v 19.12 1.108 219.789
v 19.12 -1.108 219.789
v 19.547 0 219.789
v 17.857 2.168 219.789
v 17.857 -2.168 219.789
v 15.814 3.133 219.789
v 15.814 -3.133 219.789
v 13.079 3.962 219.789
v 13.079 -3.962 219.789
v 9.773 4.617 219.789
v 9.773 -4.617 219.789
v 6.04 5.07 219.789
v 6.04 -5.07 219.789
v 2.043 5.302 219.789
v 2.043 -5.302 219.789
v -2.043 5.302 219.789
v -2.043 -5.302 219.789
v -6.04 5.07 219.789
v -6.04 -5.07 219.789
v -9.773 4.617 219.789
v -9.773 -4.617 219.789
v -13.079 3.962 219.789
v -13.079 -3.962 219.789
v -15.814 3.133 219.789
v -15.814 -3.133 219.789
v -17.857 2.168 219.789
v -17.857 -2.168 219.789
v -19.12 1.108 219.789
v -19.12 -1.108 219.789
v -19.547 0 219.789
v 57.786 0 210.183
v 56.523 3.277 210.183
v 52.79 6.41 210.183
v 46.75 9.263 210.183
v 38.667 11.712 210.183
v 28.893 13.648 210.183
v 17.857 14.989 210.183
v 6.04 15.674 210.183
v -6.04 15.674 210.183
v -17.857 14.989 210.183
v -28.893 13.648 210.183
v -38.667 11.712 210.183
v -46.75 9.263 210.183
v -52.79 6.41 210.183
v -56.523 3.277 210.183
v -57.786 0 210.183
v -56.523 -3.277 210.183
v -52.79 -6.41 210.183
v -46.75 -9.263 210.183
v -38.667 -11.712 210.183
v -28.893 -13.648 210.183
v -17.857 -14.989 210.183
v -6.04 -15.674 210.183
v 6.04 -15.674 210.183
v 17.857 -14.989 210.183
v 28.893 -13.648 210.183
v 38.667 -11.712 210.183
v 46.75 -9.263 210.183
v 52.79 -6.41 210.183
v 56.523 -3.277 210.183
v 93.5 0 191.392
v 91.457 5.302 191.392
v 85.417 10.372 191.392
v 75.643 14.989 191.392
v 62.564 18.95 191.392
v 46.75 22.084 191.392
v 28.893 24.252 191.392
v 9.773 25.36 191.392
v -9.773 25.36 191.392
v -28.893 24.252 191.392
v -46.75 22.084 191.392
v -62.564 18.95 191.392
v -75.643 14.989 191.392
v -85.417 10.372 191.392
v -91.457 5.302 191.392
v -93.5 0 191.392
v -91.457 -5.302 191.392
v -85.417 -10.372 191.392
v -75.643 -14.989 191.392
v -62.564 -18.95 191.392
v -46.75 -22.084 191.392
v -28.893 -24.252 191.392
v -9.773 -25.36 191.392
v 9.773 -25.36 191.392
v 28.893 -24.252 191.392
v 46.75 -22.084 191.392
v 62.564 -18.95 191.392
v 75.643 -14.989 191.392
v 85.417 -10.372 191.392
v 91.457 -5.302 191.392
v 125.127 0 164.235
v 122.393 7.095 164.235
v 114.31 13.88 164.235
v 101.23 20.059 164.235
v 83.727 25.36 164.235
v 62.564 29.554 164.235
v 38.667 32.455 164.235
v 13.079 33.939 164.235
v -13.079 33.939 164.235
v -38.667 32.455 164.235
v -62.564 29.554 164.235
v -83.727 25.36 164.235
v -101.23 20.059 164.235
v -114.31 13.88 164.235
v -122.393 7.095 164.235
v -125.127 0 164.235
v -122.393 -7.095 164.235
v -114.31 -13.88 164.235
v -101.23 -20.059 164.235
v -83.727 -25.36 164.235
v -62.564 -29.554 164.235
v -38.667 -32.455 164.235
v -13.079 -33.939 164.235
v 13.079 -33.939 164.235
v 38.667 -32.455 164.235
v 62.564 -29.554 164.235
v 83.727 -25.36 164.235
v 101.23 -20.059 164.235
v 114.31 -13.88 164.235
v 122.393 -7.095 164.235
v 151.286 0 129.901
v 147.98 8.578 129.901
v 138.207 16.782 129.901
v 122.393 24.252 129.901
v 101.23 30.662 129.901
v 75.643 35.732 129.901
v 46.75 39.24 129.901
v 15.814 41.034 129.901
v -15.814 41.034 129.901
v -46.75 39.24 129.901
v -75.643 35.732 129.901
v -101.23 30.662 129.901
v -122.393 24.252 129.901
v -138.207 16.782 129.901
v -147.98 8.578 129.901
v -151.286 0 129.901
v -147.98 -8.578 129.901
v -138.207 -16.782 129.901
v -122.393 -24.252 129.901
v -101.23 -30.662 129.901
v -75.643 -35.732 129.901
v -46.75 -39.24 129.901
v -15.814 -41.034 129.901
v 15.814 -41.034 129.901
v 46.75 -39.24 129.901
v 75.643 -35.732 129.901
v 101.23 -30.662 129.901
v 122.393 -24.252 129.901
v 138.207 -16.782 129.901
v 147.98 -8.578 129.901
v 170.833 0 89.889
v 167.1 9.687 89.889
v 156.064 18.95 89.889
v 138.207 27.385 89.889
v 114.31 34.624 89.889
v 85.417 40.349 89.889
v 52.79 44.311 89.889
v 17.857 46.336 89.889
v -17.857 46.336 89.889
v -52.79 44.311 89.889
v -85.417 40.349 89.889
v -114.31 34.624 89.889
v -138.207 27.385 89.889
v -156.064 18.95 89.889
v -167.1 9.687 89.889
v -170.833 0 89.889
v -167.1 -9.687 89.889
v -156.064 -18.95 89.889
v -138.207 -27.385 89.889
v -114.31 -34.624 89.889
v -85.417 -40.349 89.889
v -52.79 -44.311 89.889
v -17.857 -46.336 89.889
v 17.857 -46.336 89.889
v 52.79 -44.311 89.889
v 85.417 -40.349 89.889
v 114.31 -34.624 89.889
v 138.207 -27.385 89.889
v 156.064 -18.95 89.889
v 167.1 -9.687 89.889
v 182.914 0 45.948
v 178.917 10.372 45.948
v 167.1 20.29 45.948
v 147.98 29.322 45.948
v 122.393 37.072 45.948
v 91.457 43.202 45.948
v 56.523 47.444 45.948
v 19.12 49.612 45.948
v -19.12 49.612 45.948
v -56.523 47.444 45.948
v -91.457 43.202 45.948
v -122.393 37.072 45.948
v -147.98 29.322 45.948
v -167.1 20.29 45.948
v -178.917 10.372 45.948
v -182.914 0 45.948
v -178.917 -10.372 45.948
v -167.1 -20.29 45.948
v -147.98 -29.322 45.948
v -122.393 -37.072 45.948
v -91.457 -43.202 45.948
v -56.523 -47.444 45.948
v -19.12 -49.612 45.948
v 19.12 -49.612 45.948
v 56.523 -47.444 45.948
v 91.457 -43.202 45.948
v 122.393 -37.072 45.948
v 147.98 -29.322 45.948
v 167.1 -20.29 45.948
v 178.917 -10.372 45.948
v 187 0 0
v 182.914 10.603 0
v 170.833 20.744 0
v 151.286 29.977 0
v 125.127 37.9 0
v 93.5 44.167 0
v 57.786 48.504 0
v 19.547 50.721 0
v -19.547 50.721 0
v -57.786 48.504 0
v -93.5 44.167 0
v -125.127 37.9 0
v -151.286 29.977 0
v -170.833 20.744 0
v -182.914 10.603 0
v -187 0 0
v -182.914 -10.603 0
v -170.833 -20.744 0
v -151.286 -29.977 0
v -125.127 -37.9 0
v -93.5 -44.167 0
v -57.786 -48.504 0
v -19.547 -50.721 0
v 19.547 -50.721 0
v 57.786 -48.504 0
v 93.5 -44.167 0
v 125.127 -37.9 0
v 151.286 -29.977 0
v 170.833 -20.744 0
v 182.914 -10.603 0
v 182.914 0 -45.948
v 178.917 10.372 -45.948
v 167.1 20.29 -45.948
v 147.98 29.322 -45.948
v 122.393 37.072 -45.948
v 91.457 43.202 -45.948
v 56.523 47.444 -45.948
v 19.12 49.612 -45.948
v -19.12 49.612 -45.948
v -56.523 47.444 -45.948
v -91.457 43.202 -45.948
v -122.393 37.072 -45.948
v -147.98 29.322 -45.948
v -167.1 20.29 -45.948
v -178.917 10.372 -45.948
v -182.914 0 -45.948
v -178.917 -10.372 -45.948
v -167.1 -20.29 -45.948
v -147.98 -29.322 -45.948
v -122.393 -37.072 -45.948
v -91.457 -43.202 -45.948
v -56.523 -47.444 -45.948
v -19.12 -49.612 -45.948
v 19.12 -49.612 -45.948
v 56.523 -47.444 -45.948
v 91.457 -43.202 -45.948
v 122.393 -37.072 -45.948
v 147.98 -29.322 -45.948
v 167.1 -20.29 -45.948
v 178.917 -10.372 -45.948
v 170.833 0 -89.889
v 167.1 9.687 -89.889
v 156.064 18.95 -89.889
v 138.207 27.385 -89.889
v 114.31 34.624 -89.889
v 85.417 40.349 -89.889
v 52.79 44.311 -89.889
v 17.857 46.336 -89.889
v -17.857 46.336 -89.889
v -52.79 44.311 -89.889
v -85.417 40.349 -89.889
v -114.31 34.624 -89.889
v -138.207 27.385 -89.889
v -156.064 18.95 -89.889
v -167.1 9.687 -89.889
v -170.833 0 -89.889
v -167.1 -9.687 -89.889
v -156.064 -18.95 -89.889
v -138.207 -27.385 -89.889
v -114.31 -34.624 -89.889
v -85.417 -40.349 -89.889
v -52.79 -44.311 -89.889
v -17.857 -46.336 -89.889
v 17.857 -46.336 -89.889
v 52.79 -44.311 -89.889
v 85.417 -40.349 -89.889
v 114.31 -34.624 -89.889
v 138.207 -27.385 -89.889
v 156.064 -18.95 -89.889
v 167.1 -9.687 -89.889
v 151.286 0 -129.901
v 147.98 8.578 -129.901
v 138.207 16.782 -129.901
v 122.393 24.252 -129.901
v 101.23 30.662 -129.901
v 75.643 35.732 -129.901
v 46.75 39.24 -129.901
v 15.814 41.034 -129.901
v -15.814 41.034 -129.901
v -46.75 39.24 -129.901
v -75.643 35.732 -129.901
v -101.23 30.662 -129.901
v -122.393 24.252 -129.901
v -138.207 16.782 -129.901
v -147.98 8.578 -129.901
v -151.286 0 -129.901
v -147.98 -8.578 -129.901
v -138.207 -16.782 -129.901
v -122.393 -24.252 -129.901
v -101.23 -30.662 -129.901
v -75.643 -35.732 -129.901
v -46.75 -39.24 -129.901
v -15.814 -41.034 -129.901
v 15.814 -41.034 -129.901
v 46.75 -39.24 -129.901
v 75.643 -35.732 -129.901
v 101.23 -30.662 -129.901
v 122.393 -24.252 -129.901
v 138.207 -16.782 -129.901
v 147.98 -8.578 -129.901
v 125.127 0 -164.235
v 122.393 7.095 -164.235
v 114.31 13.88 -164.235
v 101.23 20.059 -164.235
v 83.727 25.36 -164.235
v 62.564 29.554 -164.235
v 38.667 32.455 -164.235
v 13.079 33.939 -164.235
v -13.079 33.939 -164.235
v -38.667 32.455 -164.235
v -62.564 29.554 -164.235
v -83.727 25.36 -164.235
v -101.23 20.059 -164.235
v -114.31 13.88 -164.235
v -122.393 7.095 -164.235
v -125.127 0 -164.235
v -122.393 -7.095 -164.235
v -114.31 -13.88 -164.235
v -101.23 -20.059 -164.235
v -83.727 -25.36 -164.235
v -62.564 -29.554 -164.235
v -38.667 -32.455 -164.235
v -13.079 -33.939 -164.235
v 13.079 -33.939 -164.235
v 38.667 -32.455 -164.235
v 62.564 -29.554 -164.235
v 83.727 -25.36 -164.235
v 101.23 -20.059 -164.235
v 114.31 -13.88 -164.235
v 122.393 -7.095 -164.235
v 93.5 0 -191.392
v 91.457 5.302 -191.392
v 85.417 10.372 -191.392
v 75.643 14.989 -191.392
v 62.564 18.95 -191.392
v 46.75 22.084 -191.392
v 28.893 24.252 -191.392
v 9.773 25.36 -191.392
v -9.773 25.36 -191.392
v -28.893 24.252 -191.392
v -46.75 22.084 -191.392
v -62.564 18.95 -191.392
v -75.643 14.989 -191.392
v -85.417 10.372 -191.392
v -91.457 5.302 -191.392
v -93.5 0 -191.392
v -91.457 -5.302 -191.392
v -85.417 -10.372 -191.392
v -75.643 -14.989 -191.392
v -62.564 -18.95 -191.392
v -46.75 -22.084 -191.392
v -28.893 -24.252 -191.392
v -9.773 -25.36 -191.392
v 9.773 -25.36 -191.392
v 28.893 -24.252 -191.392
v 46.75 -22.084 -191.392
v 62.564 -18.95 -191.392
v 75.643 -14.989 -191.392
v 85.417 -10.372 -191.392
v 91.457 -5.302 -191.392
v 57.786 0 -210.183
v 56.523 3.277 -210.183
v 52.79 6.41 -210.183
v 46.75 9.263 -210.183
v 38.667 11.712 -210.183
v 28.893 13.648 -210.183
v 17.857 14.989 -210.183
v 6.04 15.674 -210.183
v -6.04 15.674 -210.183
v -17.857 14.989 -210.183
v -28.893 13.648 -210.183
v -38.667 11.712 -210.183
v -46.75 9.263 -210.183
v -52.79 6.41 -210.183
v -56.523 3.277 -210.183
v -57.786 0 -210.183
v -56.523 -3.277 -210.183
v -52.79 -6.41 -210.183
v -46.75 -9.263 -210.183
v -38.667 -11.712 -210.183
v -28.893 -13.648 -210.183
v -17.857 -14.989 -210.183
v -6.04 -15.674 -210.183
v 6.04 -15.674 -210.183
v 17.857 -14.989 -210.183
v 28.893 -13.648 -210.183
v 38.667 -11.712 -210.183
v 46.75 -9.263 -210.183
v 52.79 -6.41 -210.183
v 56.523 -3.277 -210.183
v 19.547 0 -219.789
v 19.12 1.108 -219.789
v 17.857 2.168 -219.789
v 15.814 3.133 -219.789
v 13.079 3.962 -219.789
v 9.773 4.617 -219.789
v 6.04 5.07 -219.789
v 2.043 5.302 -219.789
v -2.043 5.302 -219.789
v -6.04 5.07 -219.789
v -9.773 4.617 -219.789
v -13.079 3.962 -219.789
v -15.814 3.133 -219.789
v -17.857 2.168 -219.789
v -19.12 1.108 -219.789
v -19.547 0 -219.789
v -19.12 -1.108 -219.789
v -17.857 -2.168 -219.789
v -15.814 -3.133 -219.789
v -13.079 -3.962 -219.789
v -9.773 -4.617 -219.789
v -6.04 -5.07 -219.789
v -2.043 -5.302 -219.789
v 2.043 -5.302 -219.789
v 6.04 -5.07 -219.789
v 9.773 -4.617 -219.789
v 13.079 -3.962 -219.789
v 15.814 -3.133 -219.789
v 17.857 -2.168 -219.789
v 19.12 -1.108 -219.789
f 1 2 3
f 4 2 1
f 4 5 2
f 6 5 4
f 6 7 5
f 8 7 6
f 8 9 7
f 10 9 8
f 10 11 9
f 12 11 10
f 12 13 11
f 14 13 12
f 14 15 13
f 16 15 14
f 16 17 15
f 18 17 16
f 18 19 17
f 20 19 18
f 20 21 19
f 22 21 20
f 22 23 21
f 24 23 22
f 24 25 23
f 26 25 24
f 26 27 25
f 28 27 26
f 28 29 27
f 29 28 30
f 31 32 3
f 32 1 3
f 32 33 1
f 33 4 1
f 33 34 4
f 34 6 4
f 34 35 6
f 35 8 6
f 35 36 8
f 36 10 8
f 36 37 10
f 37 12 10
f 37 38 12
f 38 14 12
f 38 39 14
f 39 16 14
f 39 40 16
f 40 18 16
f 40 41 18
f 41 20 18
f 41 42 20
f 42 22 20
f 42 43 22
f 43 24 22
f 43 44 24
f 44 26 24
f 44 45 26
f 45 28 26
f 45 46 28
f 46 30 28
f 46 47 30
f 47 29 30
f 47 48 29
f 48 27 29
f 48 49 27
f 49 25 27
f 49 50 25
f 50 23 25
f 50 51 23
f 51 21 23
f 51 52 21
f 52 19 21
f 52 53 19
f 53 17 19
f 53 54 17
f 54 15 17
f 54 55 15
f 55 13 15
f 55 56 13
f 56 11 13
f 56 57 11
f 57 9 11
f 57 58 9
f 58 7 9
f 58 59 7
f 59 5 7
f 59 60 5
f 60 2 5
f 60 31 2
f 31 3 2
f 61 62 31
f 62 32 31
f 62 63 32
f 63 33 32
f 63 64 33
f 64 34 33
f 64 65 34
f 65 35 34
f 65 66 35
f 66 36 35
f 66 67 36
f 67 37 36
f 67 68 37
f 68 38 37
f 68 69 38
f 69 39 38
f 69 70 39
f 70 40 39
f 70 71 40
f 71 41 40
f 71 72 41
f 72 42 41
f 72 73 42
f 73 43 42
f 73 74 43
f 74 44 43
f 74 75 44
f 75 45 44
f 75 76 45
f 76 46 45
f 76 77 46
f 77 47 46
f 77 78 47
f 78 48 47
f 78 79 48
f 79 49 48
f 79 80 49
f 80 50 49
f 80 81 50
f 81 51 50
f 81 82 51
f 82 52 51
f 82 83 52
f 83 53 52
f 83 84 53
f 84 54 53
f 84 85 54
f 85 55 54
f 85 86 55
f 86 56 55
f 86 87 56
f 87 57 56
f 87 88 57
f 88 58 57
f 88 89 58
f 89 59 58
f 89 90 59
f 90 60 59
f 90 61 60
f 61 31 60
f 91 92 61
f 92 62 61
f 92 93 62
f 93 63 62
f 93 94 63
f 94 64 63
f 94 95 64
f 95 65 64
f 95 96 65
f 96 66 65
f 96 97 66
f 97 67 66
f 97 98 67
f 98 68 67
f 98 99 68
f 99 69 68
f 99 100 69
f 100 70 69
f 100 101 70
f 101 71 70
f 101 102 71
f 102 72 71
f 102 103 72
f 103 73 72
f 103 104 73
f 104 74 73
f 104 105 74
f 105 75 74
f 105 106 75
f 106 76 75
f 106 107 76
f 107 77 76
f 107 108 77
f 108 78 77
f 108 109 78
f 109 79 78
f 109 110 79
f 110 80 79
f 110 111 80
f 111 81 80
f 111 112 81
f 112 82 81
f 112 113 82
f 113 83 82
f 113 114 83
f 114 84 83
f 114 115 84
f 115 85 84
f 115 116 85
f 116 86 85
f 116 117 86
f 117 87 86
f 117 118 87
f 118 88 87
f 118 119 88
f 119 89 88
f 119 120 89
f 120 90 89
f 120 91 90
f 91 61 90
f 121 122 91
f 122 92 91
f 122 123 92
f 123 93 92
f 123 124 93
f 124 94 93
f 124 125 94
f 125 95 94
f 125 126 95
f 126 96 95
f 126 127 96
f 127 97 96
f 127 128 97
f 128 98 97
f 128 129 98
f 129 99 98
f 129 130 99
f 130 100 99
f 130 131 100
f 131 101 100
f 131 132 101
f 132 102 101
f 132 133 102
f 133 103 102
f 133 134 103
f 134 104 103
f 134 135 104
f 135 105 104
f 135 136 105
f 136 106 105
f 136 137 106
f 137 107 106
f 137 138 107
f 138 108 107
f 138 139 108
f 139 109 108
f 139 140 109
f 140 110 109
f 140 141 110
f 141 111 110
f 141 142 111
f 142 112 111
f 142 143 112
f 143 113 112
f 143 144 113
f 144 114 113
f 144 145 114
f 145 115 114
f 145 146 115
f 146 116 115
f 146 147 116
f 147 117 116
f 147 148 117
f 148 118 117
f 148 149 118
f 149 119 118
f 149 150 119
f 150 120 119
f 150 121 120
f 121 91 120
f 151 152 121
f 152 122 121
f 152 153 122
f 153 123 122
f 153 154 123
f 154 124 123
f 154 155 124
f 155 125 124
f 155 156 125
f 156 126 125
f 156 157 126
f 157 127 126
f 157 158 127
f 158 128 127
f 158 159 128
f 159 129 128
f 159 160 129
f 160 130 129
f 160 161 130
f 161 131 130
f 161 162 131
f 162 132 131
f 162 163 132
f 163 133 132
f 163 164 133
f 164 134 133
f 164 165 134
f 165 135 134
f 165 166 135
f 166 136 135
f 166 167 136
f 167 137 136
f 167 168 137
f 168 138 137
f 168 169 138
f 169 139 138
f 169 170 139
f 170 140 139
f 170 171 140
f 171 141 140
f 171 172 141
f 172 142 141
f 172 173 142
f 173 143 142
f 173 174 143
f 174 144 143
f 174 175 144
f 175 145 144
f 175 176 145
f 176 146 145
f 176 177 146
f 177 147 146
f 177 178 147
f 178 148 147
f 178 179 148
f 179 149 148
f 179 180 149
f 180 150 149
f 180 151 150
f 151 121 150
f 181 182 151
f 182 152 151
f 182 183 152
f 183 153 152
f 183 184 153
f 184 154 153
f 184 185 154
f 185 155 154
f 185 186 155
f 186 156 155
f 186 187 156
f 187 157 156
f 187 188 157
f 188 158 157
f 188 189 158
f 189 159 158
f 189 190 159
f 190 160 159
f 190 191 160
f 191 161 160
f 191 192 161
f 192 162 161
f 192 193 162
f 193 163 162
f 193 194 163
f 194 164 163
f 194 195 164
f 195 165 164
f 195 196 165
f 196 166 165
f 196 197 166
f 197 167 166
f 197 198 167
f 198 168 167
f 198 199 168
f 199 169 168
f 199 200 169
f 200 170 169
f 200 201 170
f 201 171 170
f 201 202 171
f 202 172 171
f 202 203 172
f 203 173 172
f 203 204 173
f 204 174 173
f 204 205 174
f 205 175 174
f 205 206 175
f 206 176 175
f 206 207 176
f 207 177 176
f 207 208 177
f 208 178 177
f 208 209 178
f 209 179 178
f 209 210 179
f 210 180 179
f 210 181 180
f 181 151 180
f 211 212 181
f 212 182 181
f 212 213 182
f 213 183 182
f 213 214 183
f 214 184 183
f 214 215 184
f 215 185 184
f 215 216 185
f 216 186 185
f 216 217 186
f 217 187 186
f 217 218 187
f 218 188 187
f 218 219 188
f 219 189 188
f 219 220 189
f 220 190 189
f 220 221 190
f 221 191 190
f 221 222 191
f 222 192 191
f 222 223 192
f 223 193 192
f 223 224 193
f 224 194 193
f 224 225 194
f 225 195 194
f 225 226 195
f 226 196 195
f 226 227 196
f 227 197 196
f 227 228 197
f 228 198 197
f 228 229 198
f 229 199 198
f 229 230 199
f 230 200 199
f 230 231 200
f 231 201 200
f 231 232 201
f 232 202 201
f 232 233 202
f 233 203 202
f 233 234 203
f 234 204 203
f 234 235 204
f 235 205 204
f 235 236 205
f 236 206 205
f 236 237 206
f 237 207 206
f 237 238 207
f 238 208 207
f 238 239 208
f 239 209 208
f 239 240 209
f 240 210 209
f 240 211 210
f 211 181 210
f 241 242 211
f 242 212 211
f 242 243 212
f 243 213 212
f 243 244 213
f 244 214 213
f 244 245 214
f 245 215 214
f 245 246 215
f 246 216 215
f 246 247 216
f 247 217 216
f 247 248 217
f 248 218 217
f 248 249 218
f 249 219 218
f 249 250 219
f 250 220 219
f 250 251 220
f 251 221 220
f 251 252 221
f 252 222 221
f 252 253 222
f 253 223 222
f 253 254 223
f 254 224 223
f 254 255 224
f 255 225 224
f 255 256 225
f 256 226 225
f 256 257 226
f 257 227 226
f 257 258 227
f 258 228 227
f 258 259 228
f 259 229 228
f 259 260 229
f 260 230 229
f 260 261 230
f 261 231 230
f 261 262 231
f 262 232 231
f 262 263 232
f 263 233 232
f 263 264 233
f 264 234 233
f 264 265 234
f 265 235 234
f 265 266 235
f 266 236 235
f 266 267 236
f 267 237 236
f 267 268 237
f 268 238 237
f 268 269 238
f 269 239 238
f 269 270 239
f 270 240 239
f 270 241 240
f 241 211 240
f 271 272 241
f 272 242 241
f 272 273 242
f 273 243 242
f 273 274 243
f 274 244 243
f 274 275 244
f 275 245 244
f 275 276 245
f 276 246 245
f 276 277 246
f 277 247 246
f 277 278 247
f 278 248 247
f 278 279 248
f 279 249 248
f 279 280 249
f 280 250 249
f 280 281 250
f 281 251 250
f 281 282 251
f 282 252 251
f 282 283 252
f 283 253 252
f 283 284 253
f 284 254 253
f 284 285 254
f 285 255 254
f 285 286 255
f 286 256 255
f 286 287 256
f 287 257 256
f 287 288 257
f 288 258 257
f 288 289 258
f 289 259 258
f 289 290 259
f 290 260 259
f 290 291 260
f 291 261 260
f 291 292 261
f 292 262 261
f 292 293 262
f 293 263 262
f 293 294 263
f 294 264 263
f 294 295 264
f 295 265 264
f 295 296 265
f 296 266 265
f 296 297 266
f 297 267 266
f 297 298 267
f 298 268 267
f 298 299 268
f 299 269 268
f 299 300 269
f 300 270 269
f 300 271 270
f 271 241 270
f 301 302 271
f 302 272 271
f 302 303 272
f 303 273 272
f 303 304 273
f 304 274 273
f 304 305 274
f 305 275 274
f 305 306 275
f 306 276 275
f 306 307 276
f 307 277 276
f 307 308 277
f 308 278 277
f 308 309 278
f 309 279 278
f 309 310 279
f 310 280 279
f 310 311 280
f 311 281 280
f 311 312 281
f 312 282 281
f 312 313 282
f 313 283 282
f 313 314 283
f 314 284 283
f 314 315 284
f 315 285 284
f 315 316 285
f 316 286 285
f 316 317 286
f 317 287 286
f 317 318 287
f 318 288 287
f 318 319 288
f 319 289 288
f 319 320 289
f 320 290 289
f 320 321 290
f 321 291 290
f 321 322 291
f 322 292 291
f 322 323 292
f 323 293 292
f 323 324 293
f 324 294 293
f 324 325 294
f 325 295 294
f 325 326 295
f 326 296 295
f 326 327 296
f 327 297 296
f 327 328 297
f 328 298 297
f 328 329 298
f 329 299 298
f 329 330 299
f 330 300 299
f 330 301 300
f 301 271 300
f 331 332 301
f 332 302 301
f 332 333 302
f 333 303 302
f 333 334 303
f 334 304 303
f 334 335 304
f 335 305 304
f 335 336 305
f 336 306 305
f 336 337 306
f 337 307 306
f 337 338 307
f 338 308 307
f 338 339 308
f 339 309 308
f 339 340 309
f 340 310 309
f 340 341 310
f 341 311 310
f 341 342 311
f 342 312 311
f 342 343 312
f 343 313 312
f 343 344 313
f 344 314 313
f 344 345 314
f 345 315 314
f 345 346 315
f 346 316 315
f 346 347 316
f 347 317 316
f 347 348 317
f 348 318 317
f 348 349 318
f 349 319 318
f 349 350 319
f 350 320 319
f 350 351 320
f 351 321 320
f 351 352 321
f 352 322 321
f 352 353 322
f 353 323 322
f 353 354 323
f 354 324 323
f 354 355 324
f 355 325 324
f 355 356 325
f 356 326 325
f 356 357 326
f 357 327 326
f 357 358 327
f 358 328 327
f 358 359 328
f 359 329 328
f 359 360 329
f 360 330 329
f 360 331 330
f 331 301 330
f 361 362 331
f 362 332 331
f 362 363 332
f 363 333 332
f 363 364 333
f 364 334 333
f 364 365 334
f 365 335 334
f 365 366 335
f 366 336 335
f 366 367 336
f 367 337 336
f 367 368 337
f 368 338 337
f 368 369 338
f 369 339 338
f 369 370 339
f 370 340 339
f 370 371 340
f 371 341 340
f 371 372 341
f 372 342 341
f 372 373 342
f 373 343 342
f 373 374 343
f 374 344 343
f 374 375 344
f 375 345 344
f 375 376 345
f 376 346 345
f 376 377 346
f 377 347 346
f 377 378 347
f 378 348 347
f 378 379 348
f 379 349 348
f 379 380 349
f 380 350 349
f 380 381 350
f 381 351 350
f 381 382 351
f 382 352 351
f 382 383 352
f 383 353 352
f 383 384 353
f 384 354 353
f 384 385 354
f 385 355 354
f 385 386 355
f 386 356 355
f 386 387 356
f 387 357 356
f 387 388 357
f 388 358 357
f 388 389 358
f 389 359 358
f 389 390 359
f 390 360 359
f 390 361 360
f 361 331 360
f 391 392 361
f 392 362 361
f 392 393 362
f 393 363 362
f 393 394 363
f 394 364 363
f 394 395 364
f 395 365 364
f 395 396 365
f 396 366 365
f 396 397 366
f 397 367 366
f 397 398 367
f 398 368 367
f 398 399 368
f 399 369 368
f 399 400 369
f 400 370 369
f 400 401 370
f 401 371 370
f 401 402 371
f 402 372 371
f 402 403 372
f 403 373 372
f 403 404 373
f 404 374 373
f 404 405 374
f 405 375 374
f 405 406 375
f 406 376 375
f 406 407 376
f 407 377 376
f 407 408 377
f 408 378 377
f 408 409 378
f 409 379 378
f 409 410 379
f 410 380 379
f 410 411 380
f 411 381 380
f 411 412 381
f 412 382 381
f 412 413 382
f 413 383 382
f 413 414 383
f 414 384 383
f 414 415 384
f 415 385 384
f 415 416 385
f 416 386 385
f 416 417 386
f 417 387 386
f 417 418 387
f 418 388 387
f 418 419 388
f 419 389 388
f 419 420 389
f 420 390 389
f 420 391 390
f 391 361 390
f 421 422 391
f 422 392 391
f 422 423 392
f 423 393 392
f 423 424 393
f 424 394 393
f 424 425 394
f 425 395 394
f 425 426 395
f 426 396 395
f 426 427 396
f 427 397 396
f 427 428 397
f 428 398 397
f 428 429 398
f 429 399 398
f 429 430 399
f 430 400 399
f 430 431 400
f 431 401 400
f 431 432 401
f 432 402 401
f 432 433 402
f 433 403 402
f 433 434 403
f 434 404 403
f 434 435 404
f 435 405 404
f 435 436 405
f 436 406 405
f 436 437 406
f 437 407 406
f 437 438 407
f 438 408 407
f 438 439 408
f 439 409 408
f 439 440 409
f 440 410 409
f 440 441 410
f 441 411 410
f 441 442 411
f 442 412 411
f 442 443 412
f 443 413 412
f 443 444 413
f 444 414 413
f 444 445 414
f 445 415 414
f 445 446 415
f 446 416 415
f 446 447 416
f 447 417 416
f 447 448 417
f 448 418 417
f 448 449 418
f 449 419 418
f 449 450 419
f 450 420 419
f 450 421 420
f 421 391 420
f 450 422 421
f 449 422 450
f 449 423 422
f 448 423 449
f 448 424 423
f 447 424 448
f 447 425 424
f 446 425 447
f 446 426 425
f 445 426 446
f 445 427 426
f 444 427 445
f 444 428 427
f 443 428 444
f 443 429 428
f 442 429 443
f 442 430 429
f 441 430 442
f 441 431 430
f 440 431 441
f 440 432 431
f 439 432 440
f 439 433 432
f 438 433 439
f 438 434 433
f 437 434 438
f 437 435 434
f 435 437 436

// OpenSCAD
// Generated by SolidPython 1.0.1 on 2020-07-29 00:46:49


scale(v = [11, 3, 13]) {
	sphere(r = 17);
}
/***********************************************
*********      SolidPython code:      **********
************************************************
 
# import packages: SolidPython
from solid import *
from solid.utils import *
from itertools import chain, combinations, permutations


class Resize:

    def __init__(self, scad_file):
        self.scad_file = scad_file
        #self.scad_file = import_scad(scad_file)
        # cone/cylinder param:
        self.r1 = 0
        self.r2 = 0
        self.h = 0
        # rectangular prism param:
        self.w = 0
        self.l = 0
        # ellipse param:
        self.r = 0

    # import OpenScad code (file name corresponds to shape)


    # classify shape + parameters
    def assign(self, param1, param2, param3):
        if self.scad_file == 'cone.scad':
            self.r1 = param1
            self.r2 = param2
            self.h = param3
        elif self.scad_file == 'cylinder.scad':
            self.r1 = param1
            self.r2 = param2
            self.h = param3
        elif self.scad_file == 'rectangularPrism.scad':
            self.h = param1
            self.l = param2
            self.w = param3
        else:
            self.r = param1
            self.h = param2

    # resize parameters
    def iterate(self):
        x = range(3, 20, 2)
        i = 1
        if self.scad_file == 'cone.scad':
            tempList = list(permutations(x, 2))
            for temp in tempList:
                param1 = temp[0]
                param2 = temp[1]
                filepath = 'produced_scad_files/' + 'cone' + str(param1) + '_' + str(param2) + '_' + '.scad'
                scad_render_to_file(cylinder(h=param1, r1=param2, r2=0), filepath)

        elif self.scad_file == 'cylinder.scad':
            tempList = list(permutations(x, 3))
            for temp in tempList:
                param1 = temp[0]
                param2 = temp[1]
                filepath = 'produced_scad_files/' + 'cylinder' + str(param1) + '_' + str(param2) + '_' + '.scad'
                scad_render_to_file(cylinder(h=param1, r1=param2, r2=param2), filepath)

        elif self.scad_file == 'rectangularPrism.scad':
            tempList = list(permutations(x, 3))
            for temp in tempList:
                param1 = temp[0]
                param2 = temp[1]
                param3 = temp[2]
                filepath = 'produced_scad_files/' + 'rectangularPrism' + str(param1) + '_' + str(param2) + '_' + str(
                    param3) + '.scad'
                scad_render_to_file(cube(size=(param1, param2, param3)), filepath)

        elif self.scad_file == 'ellipse.scad':
            tempList = list(permutations(x, 4))
            for temp in tempList:
                param1 = temp[0]
                param2 = temp[1]
                param3 = temp[2]
                param4 = temp[3]
                filepath = 'produced_scad_files/' + 'ellipse' + str(param1) + '_' + str(param2) + '_' + str(param3) + '_' + str(param4) + '.scad'
                scad_render_to_file(scale([param1, param2, param3])(sphere(r=param4)), filepath)

    def render_to_scadfile(self):
        scad_render_to_file(scad, 'example.scad') 
 
************************************************/
